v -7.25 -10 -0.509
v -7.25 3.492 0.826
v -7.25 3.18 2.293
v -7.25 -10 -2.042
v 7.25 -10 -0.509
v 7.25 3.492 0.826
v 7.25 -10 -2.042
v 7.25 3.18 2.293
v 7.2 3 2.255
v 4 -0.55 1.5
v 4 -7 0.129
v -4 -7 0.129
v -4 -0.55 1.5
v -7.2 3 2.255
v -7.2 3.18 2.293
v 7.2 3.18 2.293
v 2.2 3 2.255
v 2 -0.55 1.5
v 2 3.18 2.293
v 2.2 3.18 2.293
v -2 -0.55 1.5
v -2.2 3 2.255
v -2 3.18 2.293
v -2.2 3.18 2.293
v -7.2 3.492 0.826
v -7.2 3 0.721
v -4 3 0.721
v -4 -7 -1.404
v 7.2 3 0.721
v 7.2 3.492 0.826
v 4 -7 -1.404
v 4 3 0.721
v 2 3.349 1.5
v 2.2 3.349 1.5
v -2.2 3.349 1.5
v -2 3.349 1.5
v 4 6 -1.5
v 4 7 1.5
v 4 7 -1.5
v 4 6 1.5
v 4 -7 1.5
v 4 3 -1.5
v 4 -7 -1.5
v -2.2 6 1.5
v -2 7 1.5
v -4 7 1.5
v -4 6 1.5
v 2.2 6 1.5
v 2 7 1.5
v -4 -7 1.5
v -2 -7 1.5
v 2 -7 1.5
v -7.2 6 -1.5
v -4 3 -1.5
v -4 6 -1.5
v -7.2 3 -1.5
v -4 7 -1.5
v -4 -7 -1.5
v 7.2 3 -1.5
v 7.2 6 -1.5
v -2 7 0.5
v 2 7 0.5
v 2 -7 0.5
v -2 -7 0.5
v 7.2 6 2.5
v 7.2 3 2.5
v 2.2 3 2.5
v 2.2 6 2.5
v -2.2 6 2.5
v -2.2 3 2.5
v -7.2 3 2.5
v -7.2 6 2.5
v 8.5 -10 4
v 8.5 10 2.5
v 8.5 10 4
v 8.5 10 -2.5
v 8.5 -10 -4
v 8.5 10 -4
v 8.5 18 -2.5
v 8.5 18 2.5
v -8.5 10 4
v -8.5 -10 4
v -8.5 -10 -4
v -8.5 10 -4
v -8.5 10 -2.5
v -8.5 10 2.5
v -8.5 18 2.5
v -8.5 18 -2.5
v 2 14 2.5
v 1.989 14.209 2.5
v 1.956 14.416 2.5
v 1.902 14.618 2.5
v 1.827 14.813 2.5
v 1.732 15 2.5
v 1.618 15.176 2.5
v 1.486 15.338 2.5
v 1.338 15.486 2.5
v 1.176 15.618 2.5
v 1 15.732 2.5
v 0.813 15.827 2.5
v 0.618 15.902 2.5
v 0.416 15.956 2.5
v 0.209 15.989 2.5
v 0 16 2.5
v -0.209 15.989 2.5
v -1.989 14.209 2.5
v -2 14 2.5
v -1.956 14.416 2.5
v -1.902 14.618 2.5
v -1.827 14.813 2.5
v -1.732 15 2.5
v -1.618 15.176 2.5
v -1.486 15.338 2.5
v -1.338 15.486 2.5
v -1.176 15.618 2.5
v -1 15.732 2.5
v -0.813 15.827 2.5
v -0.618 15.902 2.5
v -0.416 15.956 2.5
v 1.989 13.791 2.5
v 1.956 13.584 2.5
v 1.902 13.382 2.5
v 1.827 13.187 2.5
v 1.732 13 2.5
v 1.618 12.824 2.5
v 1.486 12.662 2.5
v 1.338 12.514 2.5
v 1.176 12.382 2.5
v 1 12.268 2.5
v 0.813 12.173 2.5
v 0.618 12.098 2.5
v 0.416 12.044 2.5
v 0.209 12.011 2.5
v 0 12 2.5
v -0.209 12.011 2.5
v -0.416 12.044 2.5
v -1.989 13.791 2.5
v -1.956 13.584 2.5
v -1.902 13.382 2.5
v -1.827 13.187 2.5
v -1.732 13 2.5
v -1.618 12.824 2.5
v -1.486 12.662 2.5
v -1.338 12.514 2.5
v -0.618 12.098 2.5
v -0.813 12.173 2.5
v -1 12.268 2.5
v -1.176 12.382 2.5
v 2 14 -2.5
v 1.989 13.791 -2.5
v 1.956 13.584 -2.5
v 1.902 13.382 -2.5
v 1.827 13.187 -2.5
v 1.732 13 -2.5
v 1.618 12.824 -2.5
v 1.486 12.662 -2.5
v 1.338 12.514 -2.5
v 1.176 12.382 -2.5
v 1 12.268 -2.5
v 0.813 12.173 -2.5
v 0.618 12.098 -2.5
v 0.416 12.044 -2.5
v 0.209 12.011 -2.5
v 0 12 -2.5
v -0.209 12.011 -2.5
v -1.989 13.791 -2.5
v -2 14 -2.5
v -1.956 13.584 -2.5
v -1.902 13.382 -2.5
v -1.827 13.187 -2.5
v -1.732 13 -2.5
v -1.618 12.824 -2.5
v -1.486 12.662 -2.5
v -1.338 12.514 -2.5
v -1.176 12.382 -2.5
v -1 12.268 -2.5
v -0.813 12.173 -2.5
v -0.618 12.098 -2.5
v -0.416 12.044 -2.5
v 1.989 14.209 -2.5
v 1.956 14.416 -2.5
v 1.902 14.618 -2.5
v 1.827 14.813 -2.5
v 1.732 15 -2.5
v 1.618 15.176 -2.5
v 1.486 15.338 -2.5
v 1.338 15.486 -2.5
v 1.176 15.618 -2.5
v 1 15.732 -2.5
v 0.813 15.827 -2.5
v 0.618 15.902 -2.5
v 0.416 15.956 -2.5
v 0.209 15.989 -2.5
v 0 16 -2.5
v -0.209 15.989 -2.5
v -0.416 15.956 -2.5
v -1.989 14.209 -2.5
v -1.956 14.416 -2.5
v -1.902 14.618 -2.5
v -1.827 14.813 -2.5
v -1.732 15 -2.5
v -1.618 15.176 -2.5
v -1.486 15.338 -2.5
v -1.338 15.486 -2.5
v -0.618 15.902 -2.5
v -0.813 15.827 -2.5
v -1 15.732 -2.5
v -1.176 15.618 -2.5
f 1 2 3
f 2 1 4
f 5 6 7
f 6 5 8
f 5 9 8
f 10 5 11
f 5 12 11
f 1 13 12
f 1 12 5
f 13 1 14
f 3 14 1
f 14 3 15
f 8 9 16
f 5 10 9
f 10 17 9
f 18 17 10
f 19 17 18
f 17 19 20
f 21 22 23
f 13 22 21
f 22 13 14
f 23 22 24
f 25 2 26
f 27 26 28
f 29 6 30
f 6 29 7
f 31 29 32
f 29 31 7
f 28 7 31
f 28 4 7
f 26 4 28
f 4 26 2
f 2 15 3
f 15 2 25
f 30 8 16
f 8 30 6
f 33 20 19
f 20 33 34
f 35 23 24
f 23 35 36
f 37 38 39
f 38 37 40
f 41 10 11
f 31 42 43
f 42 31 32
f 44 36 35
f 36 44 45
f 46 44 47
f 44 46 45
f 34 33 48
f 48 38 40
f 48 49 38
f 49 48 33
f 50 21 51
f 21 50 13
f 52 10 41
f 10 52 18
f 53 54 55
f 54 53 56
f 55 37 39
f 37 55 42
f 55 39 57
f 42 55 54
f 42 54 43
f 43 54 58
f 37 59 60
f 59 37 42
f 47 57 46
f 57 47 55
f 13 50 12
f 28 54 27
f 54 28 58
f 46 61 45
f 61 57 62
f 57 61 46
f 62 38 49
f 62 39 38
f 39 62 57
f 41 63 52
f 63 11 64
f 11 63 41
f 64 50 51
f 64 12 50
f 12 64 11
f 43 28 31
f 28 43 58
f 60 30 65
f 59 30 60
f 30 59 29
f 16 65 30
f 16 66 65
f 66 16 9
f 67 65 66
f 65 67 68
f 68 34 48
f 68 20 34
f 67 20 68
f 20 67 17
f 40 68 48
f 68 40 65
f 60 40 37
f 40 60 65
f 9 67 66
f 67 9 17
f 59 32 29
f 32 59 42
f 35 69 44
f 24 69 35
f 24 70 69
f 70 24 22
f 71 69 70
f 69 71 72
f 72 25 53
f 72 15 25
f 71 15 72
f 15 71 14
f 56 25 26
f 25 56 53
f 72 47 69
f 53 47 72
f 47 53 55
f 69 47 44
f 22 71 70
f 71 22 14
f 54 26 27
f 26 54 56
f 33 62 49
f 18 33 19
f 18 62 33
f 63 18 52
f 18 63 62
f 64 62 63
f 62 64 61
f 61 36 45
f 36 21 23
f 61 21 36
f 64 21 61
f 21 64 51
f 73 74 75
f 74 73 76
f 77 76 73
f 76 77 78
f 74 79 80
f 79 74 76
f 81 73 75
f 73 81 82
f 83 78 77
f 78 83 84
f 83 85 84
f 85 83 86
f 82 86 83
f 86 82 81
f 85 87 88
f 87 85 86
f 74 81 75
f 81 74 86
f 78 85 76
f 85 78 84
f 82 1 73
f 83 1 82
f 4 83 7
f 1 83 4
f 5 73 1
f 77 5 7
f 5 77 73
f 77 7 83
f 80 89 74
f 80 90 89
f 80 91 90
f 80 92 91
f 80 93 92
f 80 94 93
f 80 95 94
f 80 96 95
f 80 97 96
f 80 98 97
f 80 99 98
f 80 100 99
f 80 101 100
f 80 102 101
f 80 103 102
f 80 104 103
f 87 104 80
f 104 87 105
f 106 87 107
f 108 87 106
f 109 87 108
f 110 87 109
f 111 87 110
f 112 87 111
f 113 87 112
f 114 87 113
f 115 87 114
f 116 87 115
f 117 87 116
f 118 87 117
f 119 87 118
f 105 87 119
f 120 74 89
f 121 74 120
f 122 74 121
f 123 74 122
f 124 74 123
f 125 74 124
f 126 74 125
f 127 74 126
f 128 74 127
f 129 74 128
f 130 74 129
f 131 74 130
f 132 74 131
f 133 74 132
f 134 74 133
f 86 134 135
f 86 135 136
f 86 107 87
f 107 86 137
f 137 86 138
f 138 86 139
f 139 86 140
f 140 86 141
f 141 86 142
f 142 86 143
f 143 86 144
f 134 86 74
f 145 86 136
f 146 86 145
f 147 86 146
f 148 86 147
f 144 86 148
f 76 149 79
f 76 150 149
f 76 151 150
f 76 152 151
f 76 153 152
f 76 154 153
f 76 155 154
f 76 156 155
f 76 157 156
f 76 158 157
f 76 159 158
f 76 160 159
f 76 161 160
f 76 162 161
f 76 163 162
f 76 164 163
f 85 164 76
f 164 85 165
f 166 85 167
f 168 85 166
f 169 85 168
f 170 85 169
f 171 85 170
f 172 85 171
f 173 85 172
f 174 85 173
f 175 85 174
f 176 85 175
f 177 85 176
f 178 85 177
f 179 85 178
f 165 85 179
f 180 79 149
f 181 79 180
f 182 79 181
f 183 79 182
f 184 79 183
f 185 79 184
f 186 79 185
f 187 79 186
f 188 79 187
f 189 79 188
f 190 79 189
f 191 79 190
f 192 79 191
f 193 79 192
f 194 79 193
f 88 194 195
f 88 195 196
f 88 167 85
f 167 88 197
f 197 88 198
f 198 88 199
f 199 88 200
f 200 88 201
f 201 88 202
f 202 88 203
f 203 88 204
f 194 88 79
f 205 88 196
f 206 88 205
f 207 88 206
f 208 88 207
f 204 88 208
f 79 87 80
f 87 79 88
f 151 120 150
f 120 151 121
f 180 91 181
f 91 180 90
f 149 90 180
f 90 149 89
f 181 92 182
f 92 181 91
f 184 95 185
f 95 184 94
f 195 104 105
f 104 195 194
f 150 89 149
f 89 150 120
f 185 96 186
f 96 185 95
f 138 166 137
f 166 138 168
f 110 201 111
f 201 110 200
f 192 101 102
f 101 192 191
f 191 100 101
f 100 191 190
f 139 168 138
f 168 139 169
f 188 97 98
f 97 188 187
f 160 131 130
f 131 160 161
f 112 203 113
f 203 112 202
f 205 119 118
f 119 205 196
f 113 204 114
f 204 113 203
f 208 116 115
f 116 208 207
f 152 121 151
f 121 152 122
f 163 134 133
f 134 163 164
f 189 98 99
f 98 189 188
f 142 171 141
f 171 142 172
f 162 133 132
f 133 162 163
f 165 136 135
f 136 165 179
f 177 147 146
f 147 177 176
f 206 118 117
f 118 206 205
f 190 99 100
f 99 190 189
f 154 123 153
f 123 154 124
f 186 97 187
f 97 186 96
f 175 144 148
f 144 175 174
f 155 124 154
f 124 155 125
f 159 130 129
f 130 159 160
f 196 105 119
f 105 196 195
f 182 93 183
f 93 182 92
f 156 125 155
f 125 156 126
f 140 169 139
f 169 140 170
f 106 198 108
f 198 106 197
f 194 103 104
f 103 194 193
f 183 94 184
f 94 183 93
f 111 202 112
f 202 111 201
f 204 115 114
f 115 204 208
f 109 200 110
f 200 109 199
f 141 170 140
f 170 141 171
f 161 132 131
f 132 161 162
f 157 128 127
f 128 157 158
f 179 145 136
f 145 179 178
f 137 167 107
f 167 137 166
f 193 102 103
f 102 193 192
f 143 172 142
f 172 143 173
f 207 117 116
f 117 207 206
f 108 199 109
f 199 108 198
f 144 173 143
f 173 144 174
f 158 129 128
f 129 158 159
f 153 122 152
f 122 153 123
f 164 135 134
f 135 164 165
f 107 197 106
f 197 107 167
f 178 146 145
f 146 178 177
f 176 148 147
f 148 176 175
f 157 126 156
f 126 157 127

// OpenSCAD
// Piece of plastic to grab hold of the T-shaped metal bit that is 
// attached to the sprung reel for the actual cable to attach to.

$fn=60;




difference(){
    
    cube([17, 20, 8], center=true);
        
    cavity();
    // remove this

    // translate([25, 0, 0]){
    //     cube([50, 50, 50], center=true);
    // }
}

translate([0, 14, 0]){
    difference(){
        cube([17, 8, 5], center=true);
        cylinder(h = 6, r = 2, center=true);
    }
}




module cavity(){
    // main slope
    difference(){
        union(){
            translate([0, -4, 0]){
                rotate([12, 0, 0]){
                    difference(){
                        cube([14.5, 15, 1.5], center=true);
                        //cube([8, 14, 3], center=true);
                    }
                }
            }
            // middle cavity
            cube([8, 14, 3], center=true);
            
            // 2 wing catches
            translate([4.7, 4.5, 0.5]){
                cube([5, 3, 4], center=true);
            }
            translate([-4.7, 4.5, 0.5]){
                cube([5, 3, 4], center=true);
            }
        }
        // middle center pushing area
        translate([0, 0, 2]){
            cube([4, 15, 3], center=true);
        }
    }
    // // make top of middle cavity printable
    // translate([0, -7.1, 0]){
    //     rotate([45, 0, 0]){
    //         cube([8, 2.3, 2], center=true);
    //     }
    // }
}
